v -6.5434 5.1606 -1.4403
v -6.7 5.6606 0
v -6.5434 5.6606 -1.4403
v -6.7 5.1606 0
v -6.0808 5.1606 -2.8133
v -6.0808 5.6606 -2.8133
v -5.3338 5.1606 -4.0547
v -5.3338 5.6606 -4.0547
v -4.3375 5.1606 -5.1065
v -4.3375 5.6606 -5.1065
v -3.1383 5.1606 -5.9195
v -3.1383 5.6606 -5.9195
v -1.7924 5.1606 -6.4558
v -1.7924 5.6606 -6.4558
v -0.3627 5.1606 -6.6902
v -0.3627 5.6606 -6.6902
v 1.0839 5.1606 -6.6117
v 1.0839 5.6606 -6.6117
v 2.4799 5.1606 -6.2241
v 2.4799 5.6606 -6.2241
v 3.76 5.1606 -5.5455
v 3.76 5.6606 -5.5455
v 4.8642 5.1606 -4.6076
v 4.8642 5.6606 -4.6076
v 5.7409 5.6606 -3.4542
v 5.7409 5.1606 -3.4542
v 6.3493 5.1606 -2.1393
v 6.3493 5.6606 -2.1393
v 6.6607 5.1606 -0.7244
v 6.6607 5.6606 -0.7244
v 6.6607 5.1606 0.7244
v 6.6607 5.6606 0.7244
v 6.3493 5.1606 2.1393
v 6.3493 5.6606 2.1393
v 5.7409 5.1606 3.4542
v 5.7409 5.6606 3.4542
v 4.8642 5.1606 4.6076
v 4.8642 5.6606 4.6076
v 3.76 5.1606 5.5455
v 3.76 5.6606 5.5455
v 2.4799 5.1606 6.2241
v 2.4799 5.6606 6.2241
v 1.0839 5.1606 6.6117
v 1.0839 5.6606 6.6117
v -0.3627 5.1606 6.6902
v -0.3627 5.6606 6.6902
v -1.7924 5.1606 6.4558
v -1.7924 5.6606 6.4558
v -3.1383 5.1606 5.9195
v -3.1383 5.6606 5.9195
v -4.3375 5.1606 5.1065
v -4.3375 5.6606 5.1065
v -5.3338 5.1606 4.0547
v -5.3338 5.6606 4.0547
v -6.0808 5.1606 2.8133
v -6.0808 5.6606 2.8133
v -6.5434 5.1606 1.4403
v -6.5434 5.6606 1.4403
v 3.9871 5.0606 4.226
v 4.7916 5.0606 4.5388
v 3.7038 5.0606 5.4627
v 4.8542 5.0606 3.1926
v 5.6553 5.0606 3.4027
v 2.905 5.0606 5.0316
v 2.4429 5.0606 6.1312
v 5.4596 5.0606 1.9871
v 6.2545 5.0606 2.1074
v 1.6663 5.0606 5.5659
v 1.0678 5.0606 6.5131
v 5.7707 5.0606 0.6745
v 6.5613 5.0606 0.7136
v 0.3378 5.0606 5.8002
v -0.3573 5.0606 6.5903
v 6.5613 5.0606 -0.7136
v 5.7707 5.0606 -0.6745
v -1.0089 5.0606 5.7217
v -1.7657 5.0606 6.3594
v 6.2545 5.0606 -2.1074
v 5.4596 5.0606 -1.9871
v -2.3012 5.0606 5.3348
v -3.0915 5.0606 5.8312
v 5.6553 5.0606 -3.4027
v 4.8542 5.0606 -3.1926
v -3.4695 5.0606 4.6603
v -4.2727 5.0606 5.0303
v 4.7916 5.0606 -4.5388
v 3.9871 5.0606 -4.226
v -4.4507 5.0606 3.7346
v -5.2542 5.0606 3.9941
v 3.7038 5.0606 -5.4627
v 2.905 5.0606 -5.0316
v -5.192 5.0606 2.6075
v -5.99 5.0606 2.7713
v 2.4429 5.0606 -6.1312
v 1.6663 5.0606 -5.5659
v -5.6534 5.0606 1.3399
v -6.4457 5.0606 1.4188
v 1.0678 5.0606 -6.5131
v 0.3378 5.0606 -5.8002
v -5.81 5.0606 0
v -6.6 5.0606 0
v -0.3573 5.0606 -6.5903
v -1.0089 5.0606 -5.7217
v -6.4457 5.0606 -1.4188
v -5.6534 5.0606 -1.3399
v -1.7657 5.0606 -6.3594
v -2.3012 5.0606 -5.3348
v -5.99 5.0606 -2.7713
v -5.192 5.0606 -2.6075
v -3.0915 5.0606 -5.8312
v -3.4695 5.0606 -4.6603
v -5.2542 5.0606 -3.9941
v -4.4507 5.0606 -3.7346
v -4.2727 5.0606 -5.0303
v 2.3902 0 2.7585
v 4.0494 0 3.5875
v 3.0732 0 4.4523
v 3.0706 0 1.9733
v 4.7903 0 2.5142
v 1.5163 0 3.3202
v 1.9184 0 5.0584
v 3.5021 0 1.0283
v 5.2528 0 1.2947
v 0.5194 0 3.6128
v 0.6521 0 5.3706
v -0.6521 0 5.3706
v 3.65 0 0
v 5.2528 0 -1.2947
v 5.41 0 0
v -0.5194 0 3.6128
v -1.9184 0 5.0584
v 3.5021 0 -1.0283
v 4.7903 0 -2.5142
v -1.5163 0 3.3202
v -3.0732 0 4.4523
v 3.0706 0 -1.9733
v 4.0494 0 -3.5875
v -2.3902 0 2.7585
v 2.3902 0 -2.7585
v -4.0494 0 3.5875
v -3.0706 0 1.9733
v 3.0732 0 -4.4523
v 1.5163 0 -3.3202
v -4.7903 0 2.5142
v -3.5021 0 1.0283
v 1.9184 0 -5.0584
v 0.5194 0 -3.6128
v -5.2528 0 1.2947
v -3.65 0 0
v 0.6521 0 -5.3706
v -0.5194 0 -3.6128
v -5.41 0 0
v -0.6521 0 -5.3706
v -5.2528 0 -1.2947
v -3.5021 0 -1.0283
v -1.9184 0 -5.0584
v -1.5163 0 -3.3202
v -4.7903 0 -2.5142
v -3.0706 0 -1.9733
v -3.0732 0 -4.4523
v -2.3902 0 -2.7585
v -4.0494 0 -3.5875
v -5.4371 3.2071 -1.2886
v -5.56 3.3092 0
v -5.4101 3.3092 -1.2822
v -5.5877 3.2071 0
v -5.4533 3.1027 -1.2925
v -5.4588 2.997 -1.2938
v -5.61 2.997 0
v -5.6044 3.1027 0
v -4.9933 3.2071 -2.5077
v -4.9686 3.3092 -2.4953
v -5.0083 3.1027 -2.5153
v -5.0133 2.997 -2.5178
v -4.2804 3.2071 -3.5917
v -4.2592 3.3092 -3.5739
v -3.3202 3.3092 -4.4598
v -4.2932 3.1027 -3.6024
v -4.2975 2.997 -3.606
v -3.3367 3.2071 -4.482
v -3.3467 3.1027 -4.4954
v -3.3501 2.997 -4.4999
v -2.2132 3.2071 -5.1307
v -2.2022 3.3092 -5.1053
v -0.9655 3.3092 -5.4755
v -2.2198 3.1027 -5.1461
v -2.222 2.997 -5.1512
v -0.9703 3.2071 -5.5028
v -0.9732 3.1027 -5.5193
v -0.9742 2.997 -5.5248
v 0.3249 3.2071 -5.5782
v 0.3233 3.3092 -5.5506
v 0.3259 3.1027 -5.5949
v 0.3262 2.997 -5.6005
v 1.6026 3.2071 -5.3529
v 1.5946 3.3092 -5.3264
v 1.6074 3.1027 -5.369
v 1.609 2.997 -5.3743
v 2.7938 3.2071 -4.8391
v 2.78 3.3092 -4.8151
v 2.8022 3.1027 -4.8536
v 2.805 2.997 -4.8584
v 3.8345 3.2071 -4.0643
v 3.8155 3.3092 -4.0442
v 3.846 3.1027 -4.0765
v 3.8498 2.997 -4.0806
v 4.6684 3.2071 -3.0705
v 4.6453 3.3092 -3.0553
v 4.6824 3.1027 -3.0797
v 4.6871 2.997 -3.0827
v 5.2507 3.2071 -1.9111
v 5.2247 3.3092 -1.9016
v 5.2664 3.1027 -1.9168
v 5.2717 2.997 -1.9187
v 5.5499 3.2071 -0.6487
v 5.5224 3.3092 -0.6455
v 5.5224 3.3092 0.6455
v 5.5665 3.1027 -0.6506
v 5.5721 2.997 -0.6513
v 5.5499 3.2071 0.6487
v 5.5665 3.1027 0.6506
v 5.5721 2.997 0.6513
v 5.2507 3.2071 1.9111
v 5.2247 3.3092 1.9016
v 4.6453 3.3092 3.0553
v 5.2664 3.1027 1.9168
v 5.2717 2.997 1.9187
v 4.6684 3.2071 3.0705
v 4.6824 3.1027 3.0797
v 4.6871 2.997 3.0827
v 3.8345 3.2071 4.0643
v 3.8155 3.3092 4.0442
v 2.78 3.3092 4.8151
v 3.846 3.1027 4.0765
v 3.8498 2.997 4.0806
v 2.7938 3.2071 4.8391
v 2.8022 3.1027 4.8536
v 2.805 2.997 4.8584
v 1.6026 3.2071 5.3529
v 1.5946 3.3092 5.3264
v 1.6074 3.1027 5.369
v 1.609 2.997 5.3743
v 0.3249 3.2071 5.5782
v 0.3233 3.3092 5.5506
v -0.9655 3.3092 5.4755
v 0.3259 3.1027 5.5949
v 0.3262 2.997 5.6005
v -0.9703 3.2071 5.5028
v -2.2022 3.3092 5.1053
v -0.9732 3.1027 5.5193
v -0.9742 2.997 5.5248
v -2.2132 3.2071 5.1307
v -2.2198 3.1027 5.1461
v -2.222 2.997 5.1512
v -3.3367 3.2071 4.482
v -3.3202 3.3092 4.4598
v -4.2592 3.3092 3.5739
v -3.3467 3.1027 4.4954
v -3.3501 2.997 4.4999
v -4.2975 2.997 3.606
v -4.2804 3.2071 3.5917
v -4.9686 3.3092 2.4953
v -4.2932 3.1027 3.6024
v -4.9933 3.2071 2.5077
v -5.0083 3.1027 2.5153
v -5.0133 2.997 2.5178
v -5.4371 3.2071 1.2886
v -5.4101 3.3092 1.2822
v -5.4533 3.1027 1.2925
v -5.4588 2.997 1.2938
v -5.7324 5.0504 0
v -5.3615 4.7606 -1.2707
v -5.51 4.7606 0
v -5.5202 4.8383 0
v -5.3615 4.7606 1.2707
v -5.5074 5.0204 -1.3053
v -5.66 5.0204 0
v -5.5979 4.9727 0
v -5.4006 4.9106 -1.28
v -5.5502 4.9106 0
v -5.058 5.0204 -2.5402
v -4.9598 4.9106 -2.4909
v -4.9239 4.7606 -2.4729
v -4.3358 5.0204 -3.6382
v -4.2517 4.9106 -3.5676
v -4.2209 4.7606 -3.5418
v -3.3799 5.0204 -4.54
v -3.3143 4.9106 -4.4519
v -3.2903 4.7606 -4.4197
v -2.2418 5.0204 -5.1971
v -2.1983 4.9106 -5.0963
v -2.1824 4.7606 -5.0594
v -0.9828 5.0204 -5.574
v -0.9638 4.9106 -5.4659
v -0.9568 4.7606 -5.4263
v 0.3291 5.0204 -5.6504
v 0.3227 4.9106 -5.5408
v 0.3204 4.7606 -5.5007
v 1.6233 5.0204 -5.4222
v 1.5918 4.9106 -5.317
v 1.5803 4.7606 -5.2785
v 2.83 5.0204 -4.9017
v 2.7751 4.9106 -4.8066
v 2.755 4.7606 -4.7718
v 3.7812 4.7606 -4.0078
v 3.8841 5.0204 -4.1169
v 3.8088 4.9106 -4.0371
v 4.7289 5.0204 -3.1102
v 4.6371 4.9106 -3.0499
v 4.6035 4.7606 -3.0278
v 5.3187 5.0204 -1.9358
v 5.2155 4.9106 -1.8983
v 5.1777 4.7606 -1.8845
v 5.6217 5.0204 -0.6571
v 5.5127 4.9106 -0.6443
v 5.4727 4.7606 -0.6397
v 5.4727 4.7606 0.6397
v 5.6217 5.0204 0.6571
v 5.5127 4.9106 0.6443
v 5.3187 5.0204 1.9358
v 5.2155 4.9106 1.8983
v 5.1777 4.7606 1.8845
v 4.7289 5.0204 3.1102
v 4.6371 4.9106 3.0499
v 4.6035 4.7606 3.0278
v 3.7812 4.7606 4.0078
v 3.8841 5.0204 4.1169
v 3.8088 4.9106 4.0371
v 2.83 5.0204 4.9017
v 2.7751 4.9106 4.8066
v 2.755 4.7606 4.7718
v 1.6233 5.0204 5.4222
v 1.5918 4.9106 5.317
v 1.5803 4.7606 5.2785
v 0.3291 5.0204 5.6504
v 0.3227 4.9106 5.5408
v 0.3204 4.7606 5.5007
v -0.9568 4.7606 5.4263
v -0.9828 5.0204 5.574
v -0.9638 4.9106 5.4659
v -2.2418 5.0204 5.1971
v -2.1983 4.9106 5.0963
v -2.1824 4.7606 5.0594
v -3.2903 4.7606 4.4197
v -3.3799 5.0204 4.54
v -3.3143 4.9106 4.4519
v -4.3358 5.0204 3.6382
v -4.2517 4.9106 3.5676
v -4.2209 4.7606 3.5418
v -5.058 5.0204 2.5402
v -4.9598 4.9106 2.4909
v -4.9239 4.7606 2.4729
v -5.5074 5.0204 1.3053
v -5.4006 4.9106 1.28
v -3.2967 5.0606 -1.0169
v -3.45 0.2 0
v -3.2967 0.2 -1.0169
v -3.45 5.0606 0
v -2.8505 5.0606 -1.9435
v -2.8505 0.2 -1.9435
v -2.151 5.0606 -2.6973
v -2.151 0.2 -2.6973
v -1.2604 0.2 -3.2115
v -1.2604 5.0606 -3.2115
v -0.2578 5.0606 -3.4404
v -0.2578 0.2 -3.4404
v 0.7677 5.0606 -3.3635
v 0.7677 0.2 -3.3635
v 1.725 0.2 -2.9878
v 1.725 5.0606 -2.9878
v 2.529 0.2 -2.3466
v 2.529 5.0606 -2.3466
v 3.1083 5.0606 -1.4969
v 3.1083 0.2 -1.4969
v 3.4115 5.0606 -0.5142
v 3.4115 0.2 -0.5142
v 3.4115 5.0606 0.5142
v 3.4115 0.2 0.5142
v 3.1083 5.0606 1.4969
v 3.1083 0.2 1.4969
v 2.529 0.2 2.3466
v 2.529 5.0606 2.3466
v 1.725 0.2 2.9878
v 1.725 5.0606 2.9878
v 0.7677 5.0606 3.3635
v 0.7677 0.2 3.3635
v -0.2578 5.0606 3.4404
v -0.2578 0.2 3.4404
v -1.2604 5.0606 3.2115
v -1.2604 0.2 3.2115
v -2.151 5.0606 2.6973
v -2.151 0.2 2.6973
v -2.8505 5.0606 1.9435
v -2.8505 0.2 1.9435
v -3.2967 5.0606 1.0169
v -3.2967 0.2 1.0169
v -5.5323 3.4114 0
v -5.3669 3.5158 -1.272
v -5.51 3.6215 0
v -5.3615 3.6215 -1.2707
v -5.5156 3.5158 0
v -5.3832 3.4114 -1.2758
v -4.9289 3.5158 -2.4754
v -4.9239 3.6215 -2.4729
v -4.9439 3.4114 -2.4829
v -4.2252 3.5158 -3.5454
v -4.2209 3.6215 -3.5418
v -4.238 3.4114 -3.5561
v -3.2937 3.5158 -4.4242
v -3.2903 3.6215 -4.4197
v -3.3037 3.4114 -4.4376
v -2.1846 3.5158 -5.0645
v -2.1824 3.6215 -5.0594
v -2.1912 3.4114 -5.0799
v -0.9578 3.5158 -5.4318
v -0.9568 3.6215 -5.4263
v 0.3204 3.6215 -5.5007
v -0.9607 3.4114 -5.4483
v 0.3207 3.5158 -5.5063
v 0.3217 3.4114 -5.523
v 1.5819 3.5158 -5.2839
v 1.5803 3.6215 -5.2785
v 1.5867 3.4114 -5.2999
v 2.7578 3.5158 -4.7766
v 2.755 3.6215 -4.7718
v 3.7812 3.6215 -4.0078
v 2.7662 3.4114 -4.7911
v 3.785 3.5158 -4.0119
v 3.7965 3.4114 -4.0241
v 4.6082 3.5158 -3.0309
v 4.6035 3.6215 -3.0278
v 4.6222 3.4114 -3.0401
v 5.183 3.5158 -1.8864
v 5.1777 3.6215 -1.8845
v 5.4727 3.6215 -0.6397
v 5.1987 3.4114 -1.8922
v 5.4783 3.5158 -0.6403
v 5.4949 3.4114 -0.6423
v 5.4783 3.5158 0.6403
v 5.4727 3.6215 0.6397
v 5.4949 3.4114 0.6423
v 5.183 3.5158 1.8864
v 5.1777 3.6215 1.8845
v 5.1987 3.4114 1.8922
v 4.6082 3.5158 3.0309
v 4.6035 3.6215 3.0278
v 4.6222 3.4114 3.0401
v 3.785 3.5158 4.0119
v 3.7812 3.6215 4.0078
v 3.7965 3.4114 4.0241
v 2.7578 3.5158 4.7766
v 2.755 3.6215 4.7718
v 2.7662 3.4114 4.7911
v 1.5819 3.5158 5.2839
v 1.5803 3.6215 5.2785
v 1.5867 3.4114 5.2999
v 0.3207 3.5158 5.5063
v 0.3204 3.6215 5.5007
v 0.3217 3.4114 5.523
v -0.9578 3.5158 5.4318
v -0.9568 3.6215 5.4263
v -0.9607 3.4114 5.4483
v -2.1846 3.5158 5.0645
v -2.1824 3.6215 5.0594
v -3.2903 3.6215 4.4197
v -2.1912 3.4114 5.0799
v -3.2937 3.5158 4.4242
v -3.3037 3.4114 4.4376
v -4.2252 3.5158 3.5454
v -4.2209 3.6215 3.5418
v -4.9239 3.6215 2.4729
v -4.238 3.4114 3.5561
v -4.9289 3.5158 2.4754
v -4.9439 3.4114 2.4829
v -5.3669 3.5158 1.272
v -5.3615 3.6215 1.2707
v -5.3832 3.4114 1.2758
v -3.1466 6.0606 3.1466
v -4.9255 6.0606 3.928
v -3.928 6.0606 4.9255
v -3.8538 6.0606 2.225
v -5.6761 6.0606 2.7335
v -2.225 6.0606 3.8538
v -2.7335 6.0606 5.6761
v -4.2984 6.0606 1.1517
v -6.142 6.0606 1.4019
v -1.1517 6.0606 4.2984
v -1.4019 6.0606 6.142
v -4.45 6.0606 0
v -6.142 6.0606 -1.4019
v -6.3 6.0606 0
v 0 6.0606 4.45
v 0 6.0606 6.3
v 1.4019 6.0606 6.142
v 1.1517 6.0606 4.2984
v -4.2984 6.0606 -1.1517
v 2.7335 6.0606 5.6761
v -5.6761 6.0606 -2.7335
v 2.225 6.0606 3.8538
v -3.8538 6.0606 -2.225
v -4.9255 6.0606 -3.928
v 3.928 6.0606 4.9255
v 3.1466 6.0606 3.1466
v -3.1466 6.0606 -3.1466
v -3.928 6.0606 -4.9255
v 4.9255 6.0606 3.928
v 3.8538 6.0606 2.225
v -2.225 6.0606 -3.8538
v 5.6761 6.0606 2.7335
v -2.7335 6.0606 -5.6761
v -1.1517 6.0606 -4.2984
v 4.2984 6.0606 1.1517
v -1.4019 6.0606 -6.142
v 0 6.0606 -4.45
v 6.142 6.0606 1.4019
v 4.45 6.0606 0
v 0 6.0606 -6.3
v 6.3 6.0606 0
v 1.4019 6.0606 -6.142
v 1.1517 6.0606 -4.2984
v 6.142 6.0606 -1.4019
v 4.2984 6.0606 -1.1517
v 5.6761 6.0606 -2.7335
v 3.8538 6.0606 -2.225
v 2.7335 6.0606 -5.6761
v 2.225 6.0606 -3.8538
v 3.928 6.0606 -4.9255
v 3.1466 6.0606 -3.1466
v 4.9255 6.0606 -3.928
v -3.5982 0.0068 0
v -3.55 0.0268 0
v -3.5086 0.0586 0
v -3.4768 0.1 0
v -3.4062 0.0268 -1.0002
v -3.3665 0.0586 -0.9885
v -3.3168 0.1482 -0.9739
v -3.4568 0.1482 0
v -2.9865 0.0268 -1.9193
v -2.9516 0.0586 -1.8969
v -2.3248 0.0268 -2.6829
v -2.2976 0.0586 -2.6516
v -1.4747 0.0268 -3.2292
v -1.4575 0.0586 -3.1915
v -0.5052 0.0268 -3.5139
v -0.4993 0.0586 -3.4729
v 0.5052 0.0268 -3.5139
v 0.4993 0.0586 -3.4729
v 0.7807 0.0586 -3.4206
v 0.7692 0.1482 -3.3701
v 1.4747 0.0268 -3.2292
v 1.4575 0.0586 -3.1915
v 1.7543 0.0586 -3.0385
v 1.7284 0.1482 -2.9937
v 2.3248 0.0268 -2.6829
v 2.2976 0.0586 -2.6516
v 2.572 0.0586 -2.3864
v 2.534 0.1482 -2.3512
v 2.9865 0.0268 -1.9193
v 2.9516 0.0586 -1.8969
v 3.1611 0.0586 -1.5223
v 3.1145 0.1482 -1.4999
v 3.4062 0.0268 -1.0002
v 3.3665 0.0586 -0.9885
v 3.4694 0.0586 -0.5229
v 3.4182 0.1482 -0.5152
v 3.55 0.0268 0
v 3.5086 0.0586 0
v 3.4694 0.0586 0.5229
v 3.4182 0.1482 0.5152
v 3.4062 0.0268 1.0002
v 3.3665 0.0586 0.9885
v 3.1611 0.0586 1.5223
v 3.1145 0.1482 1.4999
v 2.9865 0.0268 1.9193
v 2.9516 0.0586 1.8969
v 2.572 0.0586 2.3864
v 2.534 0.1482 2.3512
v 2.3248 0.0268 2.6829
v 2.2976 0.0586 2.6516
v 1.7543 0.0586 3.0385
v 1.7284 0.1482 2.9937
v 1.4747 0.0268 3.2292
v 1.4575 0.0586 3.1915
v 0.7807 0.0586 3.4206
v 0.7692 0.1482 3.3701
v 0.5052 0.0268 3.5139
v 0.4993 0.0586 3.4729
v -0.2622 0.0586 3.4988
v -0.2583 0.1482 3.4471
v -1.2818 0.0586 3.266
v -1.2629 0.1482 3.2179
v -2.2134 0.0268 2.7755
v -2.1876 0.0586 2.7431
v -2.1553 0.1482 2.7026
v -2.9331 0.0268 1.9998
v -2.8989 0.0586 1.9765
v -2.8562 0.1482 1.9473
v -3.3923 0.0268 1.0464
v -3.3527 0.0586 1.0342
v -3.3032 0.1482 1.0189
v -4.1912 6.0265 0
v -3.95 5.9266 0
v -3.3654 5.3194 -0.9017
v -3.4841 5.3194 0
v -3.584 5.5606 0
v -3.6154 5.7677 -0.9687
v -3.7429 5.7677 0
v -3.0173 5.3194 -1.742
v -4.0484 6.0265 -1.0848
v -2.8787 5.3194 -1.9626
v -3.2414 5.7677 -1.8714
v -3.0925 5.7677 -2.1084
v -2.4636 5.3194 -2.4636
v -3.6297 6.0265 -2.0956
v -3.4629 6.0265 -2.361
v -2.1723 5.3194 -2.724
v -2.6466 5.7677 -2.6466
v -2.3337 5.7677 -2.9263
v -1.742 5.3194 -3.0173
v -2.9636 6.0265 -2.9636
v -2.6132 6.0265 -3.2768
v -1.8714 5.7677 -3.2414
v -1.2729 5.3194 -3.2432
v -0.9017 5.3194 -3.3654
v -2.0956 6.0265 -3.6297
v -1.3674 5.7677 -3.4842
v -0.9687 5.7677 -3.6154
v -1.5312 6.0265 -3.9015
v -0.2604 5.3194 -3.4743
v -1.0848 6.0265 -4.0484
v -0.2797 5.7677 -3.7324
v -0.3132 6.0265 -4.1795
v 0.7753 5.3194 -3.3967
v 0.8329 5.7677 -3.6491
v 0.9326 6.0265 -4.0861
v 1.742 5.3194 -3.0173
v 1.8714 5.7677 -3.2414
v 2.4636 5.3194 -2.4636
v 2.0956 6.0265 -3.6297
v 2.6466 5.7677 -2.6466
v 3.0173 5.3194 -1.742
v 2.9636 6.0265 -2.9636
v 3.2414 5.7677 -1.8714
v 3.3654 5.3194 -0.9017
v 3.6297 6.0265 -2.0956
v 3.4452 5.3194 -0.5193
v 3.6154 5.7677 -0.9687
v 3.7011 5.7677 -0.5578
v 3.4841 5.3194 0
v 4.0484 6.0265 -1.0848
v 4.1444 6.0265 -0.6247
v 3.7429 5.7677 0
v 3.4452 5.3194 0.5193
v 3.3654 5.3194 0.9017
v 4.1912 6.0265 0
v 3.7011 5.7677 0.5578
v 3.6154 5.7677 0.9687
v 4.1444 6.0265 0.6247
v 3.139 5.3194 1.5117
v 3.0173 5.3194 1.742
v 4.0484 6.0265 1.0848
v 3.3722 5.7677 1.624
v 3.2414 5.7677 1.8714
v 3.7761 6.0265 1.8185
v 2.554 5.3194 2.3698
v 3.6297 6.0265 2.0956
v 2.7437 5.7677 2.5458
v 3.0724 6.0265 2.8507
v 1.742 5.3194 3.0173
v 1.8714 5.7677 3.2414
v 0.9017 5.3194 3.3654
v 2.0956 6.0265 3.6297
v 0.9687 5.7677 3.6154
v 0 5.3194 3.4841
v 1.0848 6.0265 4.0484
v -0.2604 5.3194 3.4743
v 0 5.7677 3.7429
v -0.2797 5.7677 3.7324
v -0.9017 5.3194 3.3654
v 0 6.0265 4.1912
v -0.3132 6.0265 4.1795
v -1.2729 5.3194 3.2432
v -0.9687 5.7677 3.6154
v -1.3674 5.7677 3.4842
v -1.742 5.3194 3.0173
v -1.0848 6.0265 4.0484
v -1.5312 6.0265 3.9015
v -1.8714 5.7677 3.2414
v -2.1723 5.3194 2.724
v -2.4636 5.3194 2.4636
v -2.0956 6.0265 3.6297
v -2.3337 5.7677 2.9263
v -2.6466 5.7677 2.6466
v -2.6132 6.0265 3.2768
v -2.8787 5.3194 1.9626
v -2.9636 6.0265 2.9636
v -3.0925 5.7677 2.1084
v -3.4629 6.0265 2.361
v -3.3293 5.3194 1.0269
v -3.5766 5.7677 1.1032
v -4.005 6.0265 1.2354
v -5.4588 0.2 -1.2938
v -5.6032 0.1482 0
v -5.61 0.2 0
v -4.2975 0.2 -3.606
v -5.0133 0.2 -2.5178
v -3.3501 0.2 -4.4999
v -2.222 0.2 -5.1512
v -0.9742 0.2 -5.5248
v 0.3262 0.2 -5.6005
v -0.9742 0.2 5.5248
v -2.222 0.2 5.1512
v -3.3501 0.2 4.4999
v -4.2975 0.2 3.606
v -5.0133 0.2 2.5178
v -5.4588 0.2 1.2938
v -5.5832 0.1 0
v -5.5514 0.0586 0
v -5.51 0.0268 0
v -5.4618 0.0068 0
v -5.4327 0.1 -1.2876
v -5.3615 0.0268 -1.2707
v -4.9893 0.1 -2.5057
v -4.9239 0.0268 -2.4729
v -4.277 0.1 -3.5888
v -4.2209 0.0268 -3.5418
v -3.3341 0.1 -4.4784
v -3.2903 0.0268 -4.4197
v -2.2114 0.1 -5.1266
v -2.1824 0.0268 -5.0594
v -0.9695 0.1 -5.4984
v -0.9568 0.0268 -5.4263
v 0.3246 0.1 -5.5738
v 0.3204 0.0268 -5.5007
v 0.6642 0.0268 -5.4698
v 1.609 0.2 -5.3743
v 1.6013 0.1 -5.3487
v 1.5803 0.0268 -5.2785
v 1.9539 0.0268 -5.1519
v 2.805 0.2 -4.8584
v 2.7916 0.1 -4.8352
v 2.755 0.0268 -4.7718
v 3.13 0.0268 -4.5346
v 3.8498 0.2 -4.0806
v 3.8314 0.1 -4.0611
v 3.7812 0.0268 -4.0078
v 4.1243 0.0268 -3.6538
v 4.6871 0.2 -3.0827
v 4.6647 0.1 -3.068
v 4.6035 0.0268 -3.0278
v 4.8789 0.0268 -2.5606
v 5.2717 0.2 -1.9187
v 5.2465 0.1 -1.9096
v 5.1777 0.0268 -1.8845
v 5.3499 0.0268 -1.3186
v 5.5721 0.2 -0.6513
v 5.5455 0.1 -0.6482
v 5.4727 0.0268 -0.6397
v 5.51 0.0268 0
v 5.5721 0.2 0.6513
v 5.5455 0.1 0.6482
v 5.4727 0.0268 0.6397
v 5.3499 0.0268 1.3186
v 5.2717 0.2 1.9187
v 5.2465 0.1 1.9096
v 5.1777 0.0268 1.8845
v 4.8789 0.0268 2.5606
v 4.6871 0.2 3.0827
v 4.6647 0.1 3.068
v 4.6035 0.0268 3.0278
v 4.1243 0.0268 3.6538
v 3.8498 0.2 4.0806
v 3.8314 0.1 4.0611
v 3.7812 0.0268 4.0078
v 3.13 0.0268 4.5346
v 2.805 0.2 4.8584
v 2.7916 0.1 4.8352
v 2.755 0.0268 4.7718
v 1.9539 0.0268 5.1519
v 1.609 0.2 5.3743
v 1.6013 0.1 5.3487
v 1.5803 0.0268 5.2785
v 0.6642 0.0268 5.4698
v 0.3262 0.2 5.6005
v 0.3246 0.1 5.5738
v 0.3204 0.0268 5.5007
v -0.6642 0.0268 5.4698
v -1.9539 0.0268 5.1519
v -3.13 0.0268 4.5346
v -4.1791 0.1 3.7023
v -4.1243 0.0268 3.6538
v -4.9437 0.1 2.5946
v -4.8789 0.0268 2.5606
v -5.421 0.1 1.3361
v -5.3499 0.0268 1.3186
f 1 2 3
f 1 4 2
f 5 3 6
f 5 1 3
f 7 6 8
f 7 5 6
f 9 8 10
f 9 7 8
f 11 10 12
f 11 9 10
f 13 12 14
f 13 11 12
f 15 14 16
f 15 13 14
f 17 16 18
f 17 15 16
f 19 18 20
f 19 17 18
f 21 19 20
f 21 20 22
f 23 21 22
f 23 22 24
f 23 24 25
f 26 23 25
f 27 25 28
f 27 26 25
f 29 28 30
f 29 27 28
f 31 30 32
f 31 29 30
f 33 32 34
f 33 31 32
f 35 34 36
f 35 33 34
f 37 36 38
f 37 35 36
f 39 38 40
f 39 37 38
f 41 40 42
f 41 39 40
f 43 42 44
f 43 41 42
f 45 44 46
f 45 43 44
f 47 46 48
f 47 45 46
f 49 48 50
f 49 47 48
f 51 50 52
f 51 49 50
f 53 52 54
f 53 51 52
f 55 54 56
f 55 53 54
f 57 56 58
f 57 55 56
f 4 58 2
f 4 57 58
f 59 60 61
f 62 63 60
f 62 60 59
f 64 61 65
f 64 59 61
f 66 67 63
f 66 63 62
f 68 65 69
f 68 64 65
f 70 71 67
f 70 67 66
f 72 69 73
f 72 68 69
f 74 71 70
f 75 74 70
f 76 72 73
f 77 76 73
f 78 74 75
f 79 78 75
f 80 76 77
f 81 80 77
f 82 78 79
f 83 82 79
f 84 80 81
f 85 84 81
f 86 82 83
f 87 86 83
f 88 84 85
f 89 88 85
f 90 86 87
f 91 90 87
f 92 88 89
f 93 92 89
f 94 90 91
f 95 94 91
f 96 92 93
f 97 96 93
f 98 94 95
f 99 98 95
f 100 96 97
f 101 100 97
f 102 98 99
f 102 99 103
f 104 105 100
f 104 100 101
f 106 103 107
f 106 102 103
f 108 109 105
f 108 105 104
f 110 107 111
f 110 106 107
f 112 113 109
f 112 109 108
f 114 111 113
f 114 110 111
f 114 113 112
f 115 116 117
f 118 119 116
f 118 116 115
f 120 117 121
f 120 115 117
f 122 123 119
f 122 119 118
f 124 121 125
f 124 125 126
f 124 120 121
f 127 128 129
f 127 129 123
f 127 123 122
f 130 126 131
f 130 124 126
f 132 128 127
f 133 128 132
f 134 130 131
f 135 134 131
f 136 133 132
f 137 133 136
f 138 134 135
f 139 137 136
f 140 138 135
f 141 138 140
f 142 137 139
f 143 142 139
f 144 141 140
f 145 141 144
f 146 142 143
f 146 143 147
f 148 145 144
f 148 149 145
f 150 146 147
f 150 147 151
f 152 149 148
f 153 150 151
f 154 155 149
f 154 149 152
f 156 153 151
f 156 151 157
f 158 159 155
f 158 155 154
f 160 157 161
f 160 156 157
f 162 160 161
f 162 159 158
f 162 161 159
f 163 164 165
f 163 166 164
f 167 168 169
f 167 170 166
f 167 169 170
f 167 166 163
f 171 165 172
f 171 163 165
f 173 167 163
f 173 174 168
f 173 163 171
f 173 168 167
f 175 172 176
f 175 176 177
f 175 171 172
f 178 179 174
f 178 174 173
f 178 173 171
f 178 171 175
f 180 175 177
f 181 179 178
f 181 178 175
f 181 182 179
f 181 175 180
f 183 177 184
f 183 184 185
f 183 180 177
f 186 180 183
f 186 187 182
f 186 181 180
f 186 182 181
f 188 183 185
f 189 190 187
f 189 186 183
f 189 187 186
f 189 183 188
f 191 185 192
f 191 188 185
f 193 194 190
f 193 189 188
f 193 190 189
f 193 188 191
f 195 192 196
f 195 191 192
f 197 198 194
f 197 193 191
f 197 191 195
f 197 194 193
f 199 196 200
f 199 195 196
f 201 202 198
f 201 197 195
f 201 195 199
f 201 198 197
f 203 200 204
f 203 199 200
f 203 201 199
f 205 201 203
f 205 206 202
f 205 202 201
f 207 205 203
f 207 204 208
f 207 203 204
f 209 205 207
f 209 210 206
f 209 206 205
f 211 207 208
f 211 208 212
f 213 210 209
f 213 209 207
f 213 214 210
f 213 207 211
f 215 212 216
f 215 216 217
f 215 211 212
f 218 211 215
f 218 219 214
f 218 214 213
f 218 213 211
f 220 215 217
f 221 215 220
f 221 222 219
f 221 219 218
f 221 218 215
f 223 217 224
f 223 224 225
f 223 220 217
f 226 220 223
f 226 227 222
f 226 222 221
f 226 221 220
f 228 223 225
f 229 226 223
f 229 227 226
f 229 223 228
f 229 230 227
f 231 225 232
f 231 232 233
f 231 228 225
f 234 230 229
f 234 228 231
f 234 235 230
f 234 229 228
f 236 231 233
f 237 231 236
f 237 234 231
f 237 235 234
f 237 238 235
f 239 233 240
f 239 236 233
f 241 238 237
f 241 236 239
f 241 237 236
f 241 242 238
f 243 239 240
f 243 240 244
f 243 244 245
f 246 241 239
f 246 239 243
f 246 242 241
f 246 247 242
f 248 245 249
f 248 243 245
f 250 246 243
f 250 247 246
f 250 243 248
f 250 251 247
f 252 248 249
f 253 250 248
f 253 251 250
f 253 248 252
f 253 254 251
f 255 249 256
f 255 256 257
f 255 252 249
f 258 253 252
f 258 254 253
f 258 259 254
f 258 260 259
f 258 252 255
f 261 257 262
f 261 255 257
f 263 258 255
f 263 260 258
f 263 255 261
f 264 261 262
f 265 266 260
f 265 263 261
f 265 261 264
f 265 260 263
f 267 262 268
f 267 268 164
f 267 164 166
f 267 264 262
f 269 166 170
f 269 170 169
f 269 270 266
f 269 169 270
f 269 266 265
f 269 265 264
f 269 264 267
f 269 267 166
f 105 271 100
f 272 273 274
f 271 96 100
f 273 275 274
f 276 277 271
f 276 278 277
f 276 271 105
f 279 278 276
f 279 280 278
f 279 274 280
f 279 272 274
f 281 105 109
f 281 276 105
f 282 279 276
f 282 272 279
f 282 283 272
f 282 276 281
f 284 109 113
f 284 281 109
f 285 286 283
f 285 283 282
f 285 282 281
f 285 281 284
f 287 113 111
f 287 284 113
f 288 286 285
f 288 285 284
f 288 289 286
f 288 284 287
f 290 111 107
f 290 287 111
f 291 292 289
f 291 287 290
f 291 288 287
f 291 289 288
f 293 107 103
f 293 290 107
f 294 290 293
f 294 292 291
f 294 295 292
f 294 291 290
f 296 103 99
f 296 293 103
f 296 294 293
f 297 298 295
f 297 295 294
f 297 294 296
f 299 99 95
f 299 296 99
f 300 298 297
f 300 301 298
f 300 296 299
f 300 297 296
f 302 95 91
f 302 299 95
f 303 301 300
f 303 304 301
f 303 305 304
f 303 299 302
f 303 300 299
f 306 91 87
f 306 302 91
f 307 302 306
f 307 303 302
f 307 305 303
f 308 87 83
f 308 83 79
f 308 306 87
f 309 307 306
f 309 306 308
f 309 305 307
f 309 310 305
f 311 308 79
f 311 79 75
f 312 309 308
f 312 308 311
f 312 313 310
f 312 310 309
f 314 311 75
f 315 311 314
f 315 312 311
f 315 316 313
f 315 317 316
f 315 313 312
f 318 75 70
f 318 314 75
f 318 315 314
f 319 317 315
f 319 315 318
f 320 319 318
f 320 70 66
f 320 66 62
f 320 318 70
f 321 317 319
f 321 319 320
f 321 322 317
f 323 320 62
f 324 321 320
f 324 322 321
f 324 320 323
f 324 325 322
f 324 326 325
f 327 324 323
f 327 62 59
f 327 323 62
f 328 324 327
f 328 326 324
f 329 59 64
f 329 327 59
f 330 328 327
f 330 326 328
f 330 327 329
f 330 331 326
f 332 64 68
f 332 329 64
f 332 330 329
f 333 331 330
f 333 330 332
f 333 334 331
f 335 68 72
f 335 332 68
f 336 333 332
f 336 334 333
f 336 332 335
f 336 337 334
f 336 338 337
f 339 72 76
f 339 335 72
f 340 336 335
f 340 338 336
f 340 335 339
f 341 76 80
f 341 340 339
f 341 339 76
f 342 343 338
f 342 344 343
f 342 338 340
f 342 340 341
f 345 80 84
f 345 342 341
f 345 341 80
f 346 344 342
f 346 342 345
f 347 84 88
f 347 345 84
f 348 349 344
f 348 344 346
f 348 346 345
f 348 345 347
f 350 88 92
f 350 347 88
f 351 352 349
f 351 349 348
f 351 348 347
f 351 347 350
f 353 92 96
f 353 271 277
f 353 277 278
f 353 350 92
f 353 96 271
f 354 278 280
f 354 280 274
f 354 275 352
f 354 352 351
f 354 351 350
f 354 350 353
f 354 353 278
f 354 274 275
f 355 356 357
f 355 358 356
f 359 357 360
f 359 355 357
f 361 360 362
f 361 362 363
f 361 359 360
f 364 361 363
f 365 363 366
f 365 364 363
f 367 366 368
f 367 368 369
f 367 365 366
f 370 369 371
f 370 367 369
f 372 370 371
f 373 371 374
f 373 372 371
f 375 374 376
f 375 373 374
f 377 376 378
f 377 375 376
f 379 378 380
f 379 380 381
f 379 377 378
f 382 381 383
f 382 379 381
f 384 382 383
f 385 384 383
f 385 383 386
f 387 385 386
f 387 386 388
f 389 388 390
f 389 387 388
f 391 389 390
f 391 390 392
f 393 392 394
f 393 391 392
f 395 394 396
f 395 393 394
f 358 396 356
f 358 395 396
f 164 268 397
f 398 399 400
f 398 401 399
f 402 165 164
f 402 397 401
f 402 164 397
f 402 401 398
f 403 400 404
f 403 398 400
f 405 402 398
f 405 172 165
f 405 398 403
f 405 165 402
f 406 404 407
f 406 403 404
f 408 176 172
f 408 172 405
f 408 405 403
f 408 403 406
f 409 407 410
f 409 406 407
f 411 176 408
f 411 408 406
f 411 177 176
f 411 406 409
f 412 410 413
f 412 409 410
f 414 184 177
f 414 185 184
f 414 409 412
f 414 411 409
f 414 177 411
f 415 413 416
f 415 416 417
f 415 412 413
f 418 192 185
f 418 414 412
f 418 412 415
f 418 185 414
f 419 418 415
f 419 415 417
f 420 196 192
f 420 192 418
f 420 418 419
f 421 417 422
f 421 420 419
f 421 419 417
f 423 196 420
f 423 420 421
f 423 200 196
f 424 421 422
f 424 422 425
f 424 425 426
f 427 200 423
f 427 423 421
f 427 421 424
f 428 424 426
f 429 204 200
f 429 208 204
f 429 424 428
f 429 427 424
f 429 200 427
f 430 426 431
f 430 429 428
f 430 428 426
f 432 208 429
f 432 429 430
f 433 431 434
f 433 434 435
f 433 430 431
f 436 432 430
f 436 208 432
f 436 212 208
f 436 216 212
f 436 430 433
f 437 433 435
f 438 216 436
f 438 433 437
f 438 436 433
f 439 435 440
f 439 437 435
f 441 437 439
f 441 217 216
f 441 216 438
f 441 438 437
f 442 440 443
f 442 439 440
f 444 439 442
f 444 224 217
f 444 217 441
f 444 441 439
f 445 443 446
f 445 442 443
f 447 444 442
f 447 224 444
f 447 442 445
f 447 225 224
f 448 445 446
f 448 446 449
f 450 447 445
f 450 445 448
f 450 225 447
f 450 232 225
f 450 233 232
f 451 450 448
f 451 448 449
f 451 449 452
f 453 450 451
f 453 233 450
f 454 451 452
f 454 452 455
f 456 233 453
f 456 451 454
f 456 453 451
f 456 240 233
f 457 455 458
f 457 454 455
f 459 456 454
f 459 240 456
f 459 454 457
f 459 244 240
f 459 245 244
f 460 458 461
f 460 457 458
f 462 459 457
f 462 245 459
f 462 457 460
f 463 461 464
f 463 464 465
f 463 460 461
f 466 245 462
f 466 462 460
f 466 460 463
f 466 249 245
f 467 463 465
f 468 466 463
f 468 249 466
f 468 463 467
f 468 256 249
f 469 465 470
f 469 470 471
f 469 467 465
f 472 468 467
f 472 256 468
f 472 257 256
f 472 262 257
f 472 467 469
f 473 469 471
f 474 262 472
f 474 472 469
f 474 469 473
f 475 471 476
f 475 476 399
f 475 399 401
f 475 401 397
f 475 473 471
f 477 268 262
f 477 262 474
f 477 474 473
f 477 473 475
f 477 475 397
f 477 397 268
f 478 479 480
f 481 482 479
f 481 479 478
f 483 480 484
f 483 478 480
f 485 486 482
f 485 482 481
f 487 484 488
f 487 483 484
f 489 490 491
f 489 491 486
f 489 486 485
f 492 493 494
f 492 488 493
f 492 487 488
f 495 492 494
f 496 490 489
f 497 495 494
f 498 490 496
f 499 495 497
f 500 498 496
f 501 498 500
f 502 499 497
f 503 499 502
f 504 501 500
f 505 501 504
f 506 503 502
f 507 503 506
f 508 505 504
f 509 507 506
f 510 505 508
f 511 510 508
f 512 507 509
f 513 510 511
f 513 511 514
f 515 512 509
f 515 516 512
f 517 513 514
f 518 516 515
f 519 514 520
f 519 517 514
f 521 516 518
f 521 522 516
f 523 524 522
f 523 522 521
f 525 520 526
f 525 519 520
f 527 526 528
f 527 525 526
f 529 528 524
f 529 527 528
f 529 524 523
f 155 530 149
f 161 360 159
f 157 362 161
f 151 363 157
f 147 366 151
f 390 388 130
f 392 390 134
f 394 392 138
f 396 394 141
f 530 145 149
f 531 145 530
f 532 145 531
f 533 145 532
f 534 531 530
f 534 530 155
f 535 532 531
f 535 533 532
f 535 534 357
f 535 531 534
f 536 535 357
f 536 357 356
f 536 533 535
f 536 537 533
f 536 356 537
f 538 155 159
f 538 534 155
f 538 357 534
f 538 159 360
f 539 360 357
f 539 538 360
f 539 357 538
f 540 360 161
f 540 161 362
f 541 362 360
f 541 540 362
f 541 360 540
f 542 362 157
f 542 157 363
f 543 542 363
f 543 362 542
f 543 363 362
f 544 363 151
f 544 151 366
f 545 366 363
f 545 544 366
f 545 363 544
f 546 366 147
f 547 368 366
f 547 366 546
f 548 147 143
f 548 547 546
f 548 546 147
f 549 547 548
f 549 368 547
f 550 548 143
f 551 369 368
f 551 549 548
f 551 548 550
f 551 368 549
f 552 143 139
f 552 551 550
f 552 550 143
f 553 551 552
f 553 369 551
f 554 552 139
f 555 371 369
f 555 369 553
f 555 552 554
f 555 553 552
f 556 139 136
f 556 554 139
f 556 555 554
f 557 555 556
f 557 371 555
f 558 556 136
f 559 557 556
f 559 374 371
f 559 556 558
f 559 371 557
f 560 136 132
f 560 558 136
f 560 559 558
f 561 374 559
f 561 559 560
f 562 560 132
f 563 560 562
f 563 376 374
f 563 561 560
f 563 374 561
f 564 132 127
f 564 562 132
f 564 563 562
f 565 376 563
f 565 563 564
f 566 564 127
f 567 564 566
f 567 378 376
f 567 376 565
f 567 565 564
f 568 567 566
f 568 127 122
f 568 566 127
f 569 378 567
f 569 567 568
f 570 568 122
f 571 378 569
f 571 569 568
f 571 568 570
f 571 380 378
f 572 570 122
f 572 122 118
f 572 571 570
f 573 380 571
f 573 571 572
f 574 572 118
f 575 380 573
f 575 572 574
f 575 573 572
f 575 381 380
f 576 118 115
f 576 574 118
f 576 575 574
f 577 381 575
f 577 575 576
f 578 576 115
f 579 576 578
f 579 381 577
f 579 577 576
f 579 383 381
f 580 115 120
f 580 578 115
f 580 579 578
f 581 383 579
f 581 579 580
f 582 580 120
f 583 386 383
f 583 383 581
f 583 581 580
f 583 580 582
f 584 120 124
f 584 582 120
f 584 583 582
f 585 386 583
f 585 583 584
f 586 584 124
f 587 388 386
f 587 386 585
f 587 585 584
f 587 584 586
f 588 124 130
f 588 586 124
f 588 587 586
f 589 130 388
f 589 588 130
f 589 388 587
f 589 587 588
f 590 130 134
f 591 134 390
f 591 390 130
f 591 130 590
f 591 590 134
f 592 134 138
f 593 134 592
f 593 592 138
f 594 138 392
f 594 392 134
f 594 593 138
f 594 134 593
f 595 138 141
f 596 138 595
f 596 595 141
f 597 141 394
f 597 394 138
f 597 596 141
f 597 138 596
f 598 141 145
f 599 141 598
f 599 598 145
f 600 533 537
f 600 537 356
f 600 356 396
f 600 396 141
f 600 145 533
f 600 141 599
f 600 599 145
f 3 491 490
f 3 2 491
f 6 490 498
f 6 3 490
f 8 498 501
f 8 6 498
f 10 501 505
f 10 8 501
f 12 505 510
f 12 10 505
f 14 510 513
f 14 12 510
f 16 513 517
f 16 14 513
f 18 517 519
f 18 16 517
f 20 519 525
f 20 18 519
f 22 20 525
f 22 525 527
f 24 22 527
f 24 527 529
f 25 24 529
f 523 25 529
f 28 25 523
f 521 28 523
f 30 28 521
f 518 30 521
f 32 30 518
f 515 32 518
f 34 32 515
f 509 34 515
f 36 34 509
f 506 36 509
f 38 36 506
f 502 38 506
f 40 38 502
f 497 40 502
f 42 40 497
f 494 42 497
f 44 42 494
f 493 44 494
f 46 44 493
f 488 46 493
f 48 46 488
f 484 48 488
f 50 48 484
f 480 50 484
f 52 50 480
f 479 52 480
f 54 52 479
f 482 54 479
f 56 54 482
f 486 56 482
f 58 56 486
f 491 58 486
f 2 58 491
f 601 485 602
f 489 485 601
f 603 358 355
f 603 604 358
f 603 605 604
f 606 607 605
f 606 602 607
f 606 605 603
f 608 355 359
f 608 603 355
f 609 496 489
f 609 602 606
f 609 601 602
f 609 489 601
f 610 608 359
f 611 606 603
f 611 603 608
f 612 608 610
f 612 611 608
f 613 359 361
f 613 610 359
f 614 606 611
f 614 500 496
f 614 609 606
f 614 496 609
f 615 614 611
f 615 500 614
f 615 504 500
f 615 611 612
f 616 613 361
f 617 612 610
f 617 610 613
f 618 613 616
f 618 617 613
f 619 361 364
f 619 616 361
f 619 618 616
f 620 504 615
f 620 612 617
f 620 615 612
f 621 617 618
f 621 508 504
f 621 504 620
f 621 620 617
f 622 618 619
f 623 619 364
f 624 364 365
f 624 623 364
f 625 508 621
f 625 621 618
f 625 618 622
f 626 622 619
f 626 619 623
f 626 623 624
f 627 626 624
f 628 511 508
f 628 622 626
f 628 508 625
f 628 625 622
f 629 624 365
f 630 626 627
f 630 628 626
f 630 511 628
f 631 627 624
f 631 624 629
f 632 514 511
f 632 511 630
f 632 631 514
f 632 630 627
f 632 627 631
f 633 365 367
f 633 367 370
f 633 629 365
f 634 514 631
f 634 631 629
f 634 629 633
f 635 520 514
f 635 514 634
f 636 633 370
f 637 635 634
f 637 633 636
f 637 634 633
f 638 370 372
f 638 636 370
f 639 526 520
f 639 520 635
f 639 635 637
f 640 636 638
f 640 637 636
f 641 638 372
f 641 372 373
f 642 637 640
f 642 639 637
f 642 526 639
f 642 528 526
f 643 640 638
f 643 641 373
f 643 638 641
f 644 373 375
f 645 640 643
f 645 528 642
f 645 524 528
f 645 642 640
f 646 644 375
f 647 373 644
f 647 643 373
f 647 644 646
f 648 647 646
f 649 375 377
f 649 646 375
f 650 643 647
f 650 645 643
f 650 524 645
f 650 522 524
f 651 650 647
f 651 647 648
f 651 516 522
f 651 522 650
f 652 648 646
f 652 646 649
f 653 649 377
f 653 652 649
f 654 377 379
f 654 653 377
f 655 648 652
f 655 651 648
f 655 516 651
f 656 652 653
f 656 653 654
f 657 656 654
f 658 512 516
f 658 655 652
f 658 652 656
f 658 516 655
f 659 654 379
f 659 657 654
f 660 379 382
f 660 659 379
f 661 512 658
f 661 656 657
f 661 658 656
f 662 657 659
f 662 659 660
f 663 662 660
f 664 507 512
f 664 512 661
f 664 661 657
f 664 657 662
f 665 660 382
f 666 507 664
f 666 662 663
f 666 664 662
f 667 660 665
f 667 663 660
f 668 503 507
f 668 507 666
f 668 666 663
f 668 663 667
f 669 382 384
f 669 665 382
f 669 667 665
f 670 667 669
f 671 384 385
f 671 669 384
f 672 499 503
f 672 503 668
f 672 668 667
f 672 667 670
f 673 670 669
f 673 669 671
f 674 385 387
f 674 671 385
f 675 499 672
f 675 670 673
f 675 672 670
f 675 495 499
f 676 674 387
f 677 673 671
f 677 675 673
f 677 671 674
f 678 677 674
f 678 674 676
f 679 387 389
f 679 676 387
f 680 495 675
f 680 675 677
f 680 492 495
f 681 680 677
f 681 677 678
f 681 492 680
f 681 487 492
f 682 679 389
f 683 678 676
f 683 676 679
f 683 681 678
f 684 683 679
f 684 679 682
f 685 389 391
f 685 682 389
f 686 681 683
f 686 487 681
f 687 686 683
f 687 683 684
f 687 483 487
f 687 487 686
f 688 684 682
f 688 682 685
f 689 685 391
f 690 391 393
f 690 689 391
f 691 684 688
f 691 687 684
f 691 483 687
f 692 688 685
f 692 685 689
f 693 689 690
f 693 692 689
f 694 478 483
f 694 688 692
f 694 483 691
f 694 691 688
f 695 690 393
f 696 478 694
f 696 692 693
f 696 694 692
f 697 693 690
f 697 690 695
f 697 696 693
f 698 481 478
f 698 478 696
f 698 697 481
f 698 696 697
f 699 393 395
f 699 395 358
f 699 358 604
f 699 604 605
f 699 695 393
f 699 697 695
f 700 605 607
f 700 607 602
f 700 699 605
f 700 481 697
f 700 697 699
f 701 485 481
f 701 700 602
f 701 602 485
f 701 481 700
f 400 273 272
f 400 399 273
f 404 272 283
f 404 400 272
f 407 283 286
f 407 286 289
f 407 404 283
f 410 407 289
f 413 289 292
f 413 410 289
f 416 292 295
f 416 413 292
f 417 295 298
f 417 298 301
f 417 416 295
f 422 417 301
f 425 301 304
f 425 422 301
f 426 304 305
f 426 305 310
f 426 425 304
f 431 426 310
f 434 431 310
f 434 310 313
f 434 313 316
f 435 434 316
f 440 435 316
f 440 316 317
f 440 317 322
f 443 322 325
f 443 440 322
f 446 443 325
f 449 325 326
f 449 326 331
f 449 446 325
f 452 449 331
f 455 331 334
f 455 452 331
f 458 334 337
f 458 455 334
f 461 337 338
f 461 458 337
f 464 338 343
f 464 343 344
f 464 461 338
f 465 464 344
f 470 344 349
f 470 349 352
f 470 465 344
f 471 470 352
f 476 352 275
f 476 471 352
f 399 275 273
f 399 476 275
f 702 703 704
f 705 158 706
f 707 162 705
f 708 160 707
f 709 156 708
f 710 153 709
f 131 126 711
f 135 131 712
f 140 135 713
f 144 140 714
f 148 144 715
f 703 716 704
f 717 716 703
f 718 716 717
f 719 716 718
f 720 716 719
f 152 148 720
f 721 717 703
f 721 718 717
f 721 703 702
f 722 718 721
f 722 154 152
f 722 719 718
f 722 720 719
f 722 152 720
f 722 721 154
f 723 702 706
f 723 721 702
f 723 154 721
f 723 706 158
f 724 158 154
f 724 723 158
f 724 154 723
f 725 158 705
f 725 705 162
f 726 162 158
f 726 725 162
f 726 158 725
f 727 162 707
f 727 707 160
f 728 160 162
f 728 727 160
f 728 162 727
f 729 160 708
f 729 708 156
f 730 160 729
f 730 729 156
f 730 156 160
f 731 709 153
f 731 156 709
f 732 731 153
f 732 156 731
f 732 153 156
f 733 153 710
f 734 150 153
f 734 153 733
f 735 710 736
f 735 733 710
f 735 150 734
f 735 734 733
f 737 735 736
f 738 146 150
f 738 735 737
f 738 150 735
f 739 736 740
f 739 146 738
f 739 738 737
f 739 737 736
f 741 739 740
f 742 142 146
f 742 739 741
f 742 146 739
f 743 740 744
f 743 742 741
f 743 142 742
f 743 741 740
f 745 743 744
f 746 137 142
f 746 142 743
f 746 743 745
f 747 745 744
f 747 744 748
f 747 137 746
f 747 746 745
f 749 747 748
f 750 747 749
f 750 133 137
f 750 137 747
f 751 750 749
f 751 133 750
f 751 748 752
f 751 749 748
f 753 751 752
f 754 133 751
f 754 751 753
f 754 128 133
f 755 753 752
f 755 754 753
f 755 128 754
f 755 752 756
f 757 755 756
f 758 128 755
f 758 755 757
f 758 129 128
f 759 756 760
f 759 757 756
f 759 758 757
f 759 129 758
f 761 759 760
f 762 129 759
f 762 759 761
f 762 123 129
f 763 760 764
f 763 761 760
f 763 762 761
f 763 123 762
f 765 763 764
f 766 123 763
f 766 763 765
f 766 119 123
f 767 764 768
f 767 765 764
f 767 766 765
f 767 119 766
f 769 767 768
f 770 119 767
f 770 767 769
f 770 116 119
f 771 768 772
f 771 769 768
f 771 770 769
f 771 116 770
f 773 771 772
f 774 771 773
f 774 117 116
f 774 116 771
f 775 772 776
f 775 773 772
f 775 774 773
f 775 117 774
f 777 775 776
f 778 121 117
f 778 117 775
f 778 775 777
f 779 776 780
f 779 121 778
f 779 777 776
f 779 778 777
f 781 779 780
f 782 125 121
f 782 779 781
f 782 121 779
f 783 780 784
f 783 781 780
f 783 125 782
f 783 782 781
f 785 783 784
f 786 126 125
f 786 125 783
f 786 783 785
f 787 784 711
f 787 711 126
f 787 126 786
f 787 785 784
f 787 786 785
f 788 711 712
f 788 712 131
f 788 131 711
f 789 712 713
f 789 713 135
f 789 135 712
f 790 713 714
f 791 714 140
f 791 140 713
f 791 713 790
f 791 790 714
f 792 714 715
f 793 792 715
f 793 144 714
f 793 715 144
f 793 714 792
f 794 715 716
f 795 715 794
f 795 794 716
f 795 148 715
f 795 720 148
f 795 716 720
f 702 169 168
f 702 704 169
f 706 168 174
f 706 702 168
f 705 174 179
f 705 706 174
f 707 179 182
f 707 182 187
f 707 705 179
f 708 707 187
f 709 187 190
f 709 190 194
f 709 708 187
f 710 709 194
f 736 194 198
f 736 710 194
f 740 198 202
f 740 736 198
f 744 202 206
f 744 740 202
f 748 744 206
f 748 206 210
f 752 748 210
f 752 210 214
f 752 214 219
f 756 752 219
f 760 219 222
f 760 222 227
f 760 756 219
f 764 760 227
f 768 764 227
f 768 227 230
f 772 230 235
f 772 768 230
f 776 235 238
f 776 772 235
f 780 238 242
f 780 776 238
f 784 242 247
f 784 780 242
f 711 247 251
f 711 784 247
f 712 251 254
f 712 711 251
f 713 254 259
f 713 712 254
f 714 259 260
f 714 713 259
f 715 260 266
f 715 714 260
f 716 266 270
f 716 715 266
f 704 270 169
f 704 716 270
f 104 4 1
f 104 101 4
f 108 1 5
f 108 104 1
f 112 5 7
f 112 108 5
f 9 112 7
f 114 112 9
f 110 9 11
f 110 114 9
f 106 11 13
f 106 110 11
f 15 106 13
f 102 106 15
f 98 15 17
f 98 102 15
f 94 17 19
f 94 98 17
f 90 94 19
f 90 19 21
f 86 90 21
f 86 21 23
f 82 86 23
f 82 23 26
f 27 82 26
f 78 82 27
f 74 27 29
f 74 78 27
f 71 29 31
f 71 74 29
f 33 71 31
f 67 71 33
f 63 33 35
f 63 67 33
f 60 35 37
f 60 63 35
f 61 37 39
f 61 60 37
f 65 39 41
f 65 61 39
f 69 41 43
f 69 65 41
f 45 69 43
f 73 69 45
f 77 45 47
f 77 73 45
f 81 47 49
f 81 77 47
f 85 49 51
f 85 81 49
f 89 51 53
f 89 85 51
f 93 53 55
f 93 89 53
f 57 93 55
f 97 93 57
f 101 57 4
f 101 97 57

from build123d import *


with BuildPart() as part:
    # Sketch1 → Main Revolve (revolve)
    with BuildSketch(Plane.XY):
        with BuildLine():
            Line((-5.3, 0), (-3.65, 0))
            ThreePointArc((-3.65, 0), (-3.508578644, 0.058578644), (-3.45, 0.2))
            Line((-3.45, 0.2), (-3.45, 5.060607))
            ThreePointArc((-3.45, 5.060607), (-3.742893219, 5.767713781), (-4.45, 6.060607))
            Line((-4.45, 6.060607), (-6.3, 6.060607))
            Line((-6.3, 6.060607), (-6.7, 5.660607))
            Line((-6.7, 5.660607), (-6.7, 5.160607))
            Line((-6.7, 5.160607), (-6.6, 5.060607))
            Line((-6.6, 5.060607), (-5.81, 5.060607))
            ThreePointArc((-5.81, 5.060607), (-5.597867966, 4.972739034), (-5.51, 4.760607))
            Line((-5.51, 4.760607), (-5.51, 3.6214998))
            ThreePointArc((-5.51, 3.6214998), (-5.522579117, 3.463385917), (-5.56, 3.3092499))
            ThreePointArc((-5.56, 3.3092499), (-5.597420883, 3.155113883), (-5.61, 2.997))
            Line((-5.61, 2.997), (-5.61, 0.997))
            Line((-5.61, 0.997), (-5.61, 0.2))
            ThreePointArc((-5.61, 0.2), (-5.551421356, 0.058578644), (-5.41, 0))
            Line((-5.41, 0), (-5.3, 0))
        make_face()
    revolve(axis=Axis((0, 11.984375, 0), (0, -1, 0)))


solid = part.part
